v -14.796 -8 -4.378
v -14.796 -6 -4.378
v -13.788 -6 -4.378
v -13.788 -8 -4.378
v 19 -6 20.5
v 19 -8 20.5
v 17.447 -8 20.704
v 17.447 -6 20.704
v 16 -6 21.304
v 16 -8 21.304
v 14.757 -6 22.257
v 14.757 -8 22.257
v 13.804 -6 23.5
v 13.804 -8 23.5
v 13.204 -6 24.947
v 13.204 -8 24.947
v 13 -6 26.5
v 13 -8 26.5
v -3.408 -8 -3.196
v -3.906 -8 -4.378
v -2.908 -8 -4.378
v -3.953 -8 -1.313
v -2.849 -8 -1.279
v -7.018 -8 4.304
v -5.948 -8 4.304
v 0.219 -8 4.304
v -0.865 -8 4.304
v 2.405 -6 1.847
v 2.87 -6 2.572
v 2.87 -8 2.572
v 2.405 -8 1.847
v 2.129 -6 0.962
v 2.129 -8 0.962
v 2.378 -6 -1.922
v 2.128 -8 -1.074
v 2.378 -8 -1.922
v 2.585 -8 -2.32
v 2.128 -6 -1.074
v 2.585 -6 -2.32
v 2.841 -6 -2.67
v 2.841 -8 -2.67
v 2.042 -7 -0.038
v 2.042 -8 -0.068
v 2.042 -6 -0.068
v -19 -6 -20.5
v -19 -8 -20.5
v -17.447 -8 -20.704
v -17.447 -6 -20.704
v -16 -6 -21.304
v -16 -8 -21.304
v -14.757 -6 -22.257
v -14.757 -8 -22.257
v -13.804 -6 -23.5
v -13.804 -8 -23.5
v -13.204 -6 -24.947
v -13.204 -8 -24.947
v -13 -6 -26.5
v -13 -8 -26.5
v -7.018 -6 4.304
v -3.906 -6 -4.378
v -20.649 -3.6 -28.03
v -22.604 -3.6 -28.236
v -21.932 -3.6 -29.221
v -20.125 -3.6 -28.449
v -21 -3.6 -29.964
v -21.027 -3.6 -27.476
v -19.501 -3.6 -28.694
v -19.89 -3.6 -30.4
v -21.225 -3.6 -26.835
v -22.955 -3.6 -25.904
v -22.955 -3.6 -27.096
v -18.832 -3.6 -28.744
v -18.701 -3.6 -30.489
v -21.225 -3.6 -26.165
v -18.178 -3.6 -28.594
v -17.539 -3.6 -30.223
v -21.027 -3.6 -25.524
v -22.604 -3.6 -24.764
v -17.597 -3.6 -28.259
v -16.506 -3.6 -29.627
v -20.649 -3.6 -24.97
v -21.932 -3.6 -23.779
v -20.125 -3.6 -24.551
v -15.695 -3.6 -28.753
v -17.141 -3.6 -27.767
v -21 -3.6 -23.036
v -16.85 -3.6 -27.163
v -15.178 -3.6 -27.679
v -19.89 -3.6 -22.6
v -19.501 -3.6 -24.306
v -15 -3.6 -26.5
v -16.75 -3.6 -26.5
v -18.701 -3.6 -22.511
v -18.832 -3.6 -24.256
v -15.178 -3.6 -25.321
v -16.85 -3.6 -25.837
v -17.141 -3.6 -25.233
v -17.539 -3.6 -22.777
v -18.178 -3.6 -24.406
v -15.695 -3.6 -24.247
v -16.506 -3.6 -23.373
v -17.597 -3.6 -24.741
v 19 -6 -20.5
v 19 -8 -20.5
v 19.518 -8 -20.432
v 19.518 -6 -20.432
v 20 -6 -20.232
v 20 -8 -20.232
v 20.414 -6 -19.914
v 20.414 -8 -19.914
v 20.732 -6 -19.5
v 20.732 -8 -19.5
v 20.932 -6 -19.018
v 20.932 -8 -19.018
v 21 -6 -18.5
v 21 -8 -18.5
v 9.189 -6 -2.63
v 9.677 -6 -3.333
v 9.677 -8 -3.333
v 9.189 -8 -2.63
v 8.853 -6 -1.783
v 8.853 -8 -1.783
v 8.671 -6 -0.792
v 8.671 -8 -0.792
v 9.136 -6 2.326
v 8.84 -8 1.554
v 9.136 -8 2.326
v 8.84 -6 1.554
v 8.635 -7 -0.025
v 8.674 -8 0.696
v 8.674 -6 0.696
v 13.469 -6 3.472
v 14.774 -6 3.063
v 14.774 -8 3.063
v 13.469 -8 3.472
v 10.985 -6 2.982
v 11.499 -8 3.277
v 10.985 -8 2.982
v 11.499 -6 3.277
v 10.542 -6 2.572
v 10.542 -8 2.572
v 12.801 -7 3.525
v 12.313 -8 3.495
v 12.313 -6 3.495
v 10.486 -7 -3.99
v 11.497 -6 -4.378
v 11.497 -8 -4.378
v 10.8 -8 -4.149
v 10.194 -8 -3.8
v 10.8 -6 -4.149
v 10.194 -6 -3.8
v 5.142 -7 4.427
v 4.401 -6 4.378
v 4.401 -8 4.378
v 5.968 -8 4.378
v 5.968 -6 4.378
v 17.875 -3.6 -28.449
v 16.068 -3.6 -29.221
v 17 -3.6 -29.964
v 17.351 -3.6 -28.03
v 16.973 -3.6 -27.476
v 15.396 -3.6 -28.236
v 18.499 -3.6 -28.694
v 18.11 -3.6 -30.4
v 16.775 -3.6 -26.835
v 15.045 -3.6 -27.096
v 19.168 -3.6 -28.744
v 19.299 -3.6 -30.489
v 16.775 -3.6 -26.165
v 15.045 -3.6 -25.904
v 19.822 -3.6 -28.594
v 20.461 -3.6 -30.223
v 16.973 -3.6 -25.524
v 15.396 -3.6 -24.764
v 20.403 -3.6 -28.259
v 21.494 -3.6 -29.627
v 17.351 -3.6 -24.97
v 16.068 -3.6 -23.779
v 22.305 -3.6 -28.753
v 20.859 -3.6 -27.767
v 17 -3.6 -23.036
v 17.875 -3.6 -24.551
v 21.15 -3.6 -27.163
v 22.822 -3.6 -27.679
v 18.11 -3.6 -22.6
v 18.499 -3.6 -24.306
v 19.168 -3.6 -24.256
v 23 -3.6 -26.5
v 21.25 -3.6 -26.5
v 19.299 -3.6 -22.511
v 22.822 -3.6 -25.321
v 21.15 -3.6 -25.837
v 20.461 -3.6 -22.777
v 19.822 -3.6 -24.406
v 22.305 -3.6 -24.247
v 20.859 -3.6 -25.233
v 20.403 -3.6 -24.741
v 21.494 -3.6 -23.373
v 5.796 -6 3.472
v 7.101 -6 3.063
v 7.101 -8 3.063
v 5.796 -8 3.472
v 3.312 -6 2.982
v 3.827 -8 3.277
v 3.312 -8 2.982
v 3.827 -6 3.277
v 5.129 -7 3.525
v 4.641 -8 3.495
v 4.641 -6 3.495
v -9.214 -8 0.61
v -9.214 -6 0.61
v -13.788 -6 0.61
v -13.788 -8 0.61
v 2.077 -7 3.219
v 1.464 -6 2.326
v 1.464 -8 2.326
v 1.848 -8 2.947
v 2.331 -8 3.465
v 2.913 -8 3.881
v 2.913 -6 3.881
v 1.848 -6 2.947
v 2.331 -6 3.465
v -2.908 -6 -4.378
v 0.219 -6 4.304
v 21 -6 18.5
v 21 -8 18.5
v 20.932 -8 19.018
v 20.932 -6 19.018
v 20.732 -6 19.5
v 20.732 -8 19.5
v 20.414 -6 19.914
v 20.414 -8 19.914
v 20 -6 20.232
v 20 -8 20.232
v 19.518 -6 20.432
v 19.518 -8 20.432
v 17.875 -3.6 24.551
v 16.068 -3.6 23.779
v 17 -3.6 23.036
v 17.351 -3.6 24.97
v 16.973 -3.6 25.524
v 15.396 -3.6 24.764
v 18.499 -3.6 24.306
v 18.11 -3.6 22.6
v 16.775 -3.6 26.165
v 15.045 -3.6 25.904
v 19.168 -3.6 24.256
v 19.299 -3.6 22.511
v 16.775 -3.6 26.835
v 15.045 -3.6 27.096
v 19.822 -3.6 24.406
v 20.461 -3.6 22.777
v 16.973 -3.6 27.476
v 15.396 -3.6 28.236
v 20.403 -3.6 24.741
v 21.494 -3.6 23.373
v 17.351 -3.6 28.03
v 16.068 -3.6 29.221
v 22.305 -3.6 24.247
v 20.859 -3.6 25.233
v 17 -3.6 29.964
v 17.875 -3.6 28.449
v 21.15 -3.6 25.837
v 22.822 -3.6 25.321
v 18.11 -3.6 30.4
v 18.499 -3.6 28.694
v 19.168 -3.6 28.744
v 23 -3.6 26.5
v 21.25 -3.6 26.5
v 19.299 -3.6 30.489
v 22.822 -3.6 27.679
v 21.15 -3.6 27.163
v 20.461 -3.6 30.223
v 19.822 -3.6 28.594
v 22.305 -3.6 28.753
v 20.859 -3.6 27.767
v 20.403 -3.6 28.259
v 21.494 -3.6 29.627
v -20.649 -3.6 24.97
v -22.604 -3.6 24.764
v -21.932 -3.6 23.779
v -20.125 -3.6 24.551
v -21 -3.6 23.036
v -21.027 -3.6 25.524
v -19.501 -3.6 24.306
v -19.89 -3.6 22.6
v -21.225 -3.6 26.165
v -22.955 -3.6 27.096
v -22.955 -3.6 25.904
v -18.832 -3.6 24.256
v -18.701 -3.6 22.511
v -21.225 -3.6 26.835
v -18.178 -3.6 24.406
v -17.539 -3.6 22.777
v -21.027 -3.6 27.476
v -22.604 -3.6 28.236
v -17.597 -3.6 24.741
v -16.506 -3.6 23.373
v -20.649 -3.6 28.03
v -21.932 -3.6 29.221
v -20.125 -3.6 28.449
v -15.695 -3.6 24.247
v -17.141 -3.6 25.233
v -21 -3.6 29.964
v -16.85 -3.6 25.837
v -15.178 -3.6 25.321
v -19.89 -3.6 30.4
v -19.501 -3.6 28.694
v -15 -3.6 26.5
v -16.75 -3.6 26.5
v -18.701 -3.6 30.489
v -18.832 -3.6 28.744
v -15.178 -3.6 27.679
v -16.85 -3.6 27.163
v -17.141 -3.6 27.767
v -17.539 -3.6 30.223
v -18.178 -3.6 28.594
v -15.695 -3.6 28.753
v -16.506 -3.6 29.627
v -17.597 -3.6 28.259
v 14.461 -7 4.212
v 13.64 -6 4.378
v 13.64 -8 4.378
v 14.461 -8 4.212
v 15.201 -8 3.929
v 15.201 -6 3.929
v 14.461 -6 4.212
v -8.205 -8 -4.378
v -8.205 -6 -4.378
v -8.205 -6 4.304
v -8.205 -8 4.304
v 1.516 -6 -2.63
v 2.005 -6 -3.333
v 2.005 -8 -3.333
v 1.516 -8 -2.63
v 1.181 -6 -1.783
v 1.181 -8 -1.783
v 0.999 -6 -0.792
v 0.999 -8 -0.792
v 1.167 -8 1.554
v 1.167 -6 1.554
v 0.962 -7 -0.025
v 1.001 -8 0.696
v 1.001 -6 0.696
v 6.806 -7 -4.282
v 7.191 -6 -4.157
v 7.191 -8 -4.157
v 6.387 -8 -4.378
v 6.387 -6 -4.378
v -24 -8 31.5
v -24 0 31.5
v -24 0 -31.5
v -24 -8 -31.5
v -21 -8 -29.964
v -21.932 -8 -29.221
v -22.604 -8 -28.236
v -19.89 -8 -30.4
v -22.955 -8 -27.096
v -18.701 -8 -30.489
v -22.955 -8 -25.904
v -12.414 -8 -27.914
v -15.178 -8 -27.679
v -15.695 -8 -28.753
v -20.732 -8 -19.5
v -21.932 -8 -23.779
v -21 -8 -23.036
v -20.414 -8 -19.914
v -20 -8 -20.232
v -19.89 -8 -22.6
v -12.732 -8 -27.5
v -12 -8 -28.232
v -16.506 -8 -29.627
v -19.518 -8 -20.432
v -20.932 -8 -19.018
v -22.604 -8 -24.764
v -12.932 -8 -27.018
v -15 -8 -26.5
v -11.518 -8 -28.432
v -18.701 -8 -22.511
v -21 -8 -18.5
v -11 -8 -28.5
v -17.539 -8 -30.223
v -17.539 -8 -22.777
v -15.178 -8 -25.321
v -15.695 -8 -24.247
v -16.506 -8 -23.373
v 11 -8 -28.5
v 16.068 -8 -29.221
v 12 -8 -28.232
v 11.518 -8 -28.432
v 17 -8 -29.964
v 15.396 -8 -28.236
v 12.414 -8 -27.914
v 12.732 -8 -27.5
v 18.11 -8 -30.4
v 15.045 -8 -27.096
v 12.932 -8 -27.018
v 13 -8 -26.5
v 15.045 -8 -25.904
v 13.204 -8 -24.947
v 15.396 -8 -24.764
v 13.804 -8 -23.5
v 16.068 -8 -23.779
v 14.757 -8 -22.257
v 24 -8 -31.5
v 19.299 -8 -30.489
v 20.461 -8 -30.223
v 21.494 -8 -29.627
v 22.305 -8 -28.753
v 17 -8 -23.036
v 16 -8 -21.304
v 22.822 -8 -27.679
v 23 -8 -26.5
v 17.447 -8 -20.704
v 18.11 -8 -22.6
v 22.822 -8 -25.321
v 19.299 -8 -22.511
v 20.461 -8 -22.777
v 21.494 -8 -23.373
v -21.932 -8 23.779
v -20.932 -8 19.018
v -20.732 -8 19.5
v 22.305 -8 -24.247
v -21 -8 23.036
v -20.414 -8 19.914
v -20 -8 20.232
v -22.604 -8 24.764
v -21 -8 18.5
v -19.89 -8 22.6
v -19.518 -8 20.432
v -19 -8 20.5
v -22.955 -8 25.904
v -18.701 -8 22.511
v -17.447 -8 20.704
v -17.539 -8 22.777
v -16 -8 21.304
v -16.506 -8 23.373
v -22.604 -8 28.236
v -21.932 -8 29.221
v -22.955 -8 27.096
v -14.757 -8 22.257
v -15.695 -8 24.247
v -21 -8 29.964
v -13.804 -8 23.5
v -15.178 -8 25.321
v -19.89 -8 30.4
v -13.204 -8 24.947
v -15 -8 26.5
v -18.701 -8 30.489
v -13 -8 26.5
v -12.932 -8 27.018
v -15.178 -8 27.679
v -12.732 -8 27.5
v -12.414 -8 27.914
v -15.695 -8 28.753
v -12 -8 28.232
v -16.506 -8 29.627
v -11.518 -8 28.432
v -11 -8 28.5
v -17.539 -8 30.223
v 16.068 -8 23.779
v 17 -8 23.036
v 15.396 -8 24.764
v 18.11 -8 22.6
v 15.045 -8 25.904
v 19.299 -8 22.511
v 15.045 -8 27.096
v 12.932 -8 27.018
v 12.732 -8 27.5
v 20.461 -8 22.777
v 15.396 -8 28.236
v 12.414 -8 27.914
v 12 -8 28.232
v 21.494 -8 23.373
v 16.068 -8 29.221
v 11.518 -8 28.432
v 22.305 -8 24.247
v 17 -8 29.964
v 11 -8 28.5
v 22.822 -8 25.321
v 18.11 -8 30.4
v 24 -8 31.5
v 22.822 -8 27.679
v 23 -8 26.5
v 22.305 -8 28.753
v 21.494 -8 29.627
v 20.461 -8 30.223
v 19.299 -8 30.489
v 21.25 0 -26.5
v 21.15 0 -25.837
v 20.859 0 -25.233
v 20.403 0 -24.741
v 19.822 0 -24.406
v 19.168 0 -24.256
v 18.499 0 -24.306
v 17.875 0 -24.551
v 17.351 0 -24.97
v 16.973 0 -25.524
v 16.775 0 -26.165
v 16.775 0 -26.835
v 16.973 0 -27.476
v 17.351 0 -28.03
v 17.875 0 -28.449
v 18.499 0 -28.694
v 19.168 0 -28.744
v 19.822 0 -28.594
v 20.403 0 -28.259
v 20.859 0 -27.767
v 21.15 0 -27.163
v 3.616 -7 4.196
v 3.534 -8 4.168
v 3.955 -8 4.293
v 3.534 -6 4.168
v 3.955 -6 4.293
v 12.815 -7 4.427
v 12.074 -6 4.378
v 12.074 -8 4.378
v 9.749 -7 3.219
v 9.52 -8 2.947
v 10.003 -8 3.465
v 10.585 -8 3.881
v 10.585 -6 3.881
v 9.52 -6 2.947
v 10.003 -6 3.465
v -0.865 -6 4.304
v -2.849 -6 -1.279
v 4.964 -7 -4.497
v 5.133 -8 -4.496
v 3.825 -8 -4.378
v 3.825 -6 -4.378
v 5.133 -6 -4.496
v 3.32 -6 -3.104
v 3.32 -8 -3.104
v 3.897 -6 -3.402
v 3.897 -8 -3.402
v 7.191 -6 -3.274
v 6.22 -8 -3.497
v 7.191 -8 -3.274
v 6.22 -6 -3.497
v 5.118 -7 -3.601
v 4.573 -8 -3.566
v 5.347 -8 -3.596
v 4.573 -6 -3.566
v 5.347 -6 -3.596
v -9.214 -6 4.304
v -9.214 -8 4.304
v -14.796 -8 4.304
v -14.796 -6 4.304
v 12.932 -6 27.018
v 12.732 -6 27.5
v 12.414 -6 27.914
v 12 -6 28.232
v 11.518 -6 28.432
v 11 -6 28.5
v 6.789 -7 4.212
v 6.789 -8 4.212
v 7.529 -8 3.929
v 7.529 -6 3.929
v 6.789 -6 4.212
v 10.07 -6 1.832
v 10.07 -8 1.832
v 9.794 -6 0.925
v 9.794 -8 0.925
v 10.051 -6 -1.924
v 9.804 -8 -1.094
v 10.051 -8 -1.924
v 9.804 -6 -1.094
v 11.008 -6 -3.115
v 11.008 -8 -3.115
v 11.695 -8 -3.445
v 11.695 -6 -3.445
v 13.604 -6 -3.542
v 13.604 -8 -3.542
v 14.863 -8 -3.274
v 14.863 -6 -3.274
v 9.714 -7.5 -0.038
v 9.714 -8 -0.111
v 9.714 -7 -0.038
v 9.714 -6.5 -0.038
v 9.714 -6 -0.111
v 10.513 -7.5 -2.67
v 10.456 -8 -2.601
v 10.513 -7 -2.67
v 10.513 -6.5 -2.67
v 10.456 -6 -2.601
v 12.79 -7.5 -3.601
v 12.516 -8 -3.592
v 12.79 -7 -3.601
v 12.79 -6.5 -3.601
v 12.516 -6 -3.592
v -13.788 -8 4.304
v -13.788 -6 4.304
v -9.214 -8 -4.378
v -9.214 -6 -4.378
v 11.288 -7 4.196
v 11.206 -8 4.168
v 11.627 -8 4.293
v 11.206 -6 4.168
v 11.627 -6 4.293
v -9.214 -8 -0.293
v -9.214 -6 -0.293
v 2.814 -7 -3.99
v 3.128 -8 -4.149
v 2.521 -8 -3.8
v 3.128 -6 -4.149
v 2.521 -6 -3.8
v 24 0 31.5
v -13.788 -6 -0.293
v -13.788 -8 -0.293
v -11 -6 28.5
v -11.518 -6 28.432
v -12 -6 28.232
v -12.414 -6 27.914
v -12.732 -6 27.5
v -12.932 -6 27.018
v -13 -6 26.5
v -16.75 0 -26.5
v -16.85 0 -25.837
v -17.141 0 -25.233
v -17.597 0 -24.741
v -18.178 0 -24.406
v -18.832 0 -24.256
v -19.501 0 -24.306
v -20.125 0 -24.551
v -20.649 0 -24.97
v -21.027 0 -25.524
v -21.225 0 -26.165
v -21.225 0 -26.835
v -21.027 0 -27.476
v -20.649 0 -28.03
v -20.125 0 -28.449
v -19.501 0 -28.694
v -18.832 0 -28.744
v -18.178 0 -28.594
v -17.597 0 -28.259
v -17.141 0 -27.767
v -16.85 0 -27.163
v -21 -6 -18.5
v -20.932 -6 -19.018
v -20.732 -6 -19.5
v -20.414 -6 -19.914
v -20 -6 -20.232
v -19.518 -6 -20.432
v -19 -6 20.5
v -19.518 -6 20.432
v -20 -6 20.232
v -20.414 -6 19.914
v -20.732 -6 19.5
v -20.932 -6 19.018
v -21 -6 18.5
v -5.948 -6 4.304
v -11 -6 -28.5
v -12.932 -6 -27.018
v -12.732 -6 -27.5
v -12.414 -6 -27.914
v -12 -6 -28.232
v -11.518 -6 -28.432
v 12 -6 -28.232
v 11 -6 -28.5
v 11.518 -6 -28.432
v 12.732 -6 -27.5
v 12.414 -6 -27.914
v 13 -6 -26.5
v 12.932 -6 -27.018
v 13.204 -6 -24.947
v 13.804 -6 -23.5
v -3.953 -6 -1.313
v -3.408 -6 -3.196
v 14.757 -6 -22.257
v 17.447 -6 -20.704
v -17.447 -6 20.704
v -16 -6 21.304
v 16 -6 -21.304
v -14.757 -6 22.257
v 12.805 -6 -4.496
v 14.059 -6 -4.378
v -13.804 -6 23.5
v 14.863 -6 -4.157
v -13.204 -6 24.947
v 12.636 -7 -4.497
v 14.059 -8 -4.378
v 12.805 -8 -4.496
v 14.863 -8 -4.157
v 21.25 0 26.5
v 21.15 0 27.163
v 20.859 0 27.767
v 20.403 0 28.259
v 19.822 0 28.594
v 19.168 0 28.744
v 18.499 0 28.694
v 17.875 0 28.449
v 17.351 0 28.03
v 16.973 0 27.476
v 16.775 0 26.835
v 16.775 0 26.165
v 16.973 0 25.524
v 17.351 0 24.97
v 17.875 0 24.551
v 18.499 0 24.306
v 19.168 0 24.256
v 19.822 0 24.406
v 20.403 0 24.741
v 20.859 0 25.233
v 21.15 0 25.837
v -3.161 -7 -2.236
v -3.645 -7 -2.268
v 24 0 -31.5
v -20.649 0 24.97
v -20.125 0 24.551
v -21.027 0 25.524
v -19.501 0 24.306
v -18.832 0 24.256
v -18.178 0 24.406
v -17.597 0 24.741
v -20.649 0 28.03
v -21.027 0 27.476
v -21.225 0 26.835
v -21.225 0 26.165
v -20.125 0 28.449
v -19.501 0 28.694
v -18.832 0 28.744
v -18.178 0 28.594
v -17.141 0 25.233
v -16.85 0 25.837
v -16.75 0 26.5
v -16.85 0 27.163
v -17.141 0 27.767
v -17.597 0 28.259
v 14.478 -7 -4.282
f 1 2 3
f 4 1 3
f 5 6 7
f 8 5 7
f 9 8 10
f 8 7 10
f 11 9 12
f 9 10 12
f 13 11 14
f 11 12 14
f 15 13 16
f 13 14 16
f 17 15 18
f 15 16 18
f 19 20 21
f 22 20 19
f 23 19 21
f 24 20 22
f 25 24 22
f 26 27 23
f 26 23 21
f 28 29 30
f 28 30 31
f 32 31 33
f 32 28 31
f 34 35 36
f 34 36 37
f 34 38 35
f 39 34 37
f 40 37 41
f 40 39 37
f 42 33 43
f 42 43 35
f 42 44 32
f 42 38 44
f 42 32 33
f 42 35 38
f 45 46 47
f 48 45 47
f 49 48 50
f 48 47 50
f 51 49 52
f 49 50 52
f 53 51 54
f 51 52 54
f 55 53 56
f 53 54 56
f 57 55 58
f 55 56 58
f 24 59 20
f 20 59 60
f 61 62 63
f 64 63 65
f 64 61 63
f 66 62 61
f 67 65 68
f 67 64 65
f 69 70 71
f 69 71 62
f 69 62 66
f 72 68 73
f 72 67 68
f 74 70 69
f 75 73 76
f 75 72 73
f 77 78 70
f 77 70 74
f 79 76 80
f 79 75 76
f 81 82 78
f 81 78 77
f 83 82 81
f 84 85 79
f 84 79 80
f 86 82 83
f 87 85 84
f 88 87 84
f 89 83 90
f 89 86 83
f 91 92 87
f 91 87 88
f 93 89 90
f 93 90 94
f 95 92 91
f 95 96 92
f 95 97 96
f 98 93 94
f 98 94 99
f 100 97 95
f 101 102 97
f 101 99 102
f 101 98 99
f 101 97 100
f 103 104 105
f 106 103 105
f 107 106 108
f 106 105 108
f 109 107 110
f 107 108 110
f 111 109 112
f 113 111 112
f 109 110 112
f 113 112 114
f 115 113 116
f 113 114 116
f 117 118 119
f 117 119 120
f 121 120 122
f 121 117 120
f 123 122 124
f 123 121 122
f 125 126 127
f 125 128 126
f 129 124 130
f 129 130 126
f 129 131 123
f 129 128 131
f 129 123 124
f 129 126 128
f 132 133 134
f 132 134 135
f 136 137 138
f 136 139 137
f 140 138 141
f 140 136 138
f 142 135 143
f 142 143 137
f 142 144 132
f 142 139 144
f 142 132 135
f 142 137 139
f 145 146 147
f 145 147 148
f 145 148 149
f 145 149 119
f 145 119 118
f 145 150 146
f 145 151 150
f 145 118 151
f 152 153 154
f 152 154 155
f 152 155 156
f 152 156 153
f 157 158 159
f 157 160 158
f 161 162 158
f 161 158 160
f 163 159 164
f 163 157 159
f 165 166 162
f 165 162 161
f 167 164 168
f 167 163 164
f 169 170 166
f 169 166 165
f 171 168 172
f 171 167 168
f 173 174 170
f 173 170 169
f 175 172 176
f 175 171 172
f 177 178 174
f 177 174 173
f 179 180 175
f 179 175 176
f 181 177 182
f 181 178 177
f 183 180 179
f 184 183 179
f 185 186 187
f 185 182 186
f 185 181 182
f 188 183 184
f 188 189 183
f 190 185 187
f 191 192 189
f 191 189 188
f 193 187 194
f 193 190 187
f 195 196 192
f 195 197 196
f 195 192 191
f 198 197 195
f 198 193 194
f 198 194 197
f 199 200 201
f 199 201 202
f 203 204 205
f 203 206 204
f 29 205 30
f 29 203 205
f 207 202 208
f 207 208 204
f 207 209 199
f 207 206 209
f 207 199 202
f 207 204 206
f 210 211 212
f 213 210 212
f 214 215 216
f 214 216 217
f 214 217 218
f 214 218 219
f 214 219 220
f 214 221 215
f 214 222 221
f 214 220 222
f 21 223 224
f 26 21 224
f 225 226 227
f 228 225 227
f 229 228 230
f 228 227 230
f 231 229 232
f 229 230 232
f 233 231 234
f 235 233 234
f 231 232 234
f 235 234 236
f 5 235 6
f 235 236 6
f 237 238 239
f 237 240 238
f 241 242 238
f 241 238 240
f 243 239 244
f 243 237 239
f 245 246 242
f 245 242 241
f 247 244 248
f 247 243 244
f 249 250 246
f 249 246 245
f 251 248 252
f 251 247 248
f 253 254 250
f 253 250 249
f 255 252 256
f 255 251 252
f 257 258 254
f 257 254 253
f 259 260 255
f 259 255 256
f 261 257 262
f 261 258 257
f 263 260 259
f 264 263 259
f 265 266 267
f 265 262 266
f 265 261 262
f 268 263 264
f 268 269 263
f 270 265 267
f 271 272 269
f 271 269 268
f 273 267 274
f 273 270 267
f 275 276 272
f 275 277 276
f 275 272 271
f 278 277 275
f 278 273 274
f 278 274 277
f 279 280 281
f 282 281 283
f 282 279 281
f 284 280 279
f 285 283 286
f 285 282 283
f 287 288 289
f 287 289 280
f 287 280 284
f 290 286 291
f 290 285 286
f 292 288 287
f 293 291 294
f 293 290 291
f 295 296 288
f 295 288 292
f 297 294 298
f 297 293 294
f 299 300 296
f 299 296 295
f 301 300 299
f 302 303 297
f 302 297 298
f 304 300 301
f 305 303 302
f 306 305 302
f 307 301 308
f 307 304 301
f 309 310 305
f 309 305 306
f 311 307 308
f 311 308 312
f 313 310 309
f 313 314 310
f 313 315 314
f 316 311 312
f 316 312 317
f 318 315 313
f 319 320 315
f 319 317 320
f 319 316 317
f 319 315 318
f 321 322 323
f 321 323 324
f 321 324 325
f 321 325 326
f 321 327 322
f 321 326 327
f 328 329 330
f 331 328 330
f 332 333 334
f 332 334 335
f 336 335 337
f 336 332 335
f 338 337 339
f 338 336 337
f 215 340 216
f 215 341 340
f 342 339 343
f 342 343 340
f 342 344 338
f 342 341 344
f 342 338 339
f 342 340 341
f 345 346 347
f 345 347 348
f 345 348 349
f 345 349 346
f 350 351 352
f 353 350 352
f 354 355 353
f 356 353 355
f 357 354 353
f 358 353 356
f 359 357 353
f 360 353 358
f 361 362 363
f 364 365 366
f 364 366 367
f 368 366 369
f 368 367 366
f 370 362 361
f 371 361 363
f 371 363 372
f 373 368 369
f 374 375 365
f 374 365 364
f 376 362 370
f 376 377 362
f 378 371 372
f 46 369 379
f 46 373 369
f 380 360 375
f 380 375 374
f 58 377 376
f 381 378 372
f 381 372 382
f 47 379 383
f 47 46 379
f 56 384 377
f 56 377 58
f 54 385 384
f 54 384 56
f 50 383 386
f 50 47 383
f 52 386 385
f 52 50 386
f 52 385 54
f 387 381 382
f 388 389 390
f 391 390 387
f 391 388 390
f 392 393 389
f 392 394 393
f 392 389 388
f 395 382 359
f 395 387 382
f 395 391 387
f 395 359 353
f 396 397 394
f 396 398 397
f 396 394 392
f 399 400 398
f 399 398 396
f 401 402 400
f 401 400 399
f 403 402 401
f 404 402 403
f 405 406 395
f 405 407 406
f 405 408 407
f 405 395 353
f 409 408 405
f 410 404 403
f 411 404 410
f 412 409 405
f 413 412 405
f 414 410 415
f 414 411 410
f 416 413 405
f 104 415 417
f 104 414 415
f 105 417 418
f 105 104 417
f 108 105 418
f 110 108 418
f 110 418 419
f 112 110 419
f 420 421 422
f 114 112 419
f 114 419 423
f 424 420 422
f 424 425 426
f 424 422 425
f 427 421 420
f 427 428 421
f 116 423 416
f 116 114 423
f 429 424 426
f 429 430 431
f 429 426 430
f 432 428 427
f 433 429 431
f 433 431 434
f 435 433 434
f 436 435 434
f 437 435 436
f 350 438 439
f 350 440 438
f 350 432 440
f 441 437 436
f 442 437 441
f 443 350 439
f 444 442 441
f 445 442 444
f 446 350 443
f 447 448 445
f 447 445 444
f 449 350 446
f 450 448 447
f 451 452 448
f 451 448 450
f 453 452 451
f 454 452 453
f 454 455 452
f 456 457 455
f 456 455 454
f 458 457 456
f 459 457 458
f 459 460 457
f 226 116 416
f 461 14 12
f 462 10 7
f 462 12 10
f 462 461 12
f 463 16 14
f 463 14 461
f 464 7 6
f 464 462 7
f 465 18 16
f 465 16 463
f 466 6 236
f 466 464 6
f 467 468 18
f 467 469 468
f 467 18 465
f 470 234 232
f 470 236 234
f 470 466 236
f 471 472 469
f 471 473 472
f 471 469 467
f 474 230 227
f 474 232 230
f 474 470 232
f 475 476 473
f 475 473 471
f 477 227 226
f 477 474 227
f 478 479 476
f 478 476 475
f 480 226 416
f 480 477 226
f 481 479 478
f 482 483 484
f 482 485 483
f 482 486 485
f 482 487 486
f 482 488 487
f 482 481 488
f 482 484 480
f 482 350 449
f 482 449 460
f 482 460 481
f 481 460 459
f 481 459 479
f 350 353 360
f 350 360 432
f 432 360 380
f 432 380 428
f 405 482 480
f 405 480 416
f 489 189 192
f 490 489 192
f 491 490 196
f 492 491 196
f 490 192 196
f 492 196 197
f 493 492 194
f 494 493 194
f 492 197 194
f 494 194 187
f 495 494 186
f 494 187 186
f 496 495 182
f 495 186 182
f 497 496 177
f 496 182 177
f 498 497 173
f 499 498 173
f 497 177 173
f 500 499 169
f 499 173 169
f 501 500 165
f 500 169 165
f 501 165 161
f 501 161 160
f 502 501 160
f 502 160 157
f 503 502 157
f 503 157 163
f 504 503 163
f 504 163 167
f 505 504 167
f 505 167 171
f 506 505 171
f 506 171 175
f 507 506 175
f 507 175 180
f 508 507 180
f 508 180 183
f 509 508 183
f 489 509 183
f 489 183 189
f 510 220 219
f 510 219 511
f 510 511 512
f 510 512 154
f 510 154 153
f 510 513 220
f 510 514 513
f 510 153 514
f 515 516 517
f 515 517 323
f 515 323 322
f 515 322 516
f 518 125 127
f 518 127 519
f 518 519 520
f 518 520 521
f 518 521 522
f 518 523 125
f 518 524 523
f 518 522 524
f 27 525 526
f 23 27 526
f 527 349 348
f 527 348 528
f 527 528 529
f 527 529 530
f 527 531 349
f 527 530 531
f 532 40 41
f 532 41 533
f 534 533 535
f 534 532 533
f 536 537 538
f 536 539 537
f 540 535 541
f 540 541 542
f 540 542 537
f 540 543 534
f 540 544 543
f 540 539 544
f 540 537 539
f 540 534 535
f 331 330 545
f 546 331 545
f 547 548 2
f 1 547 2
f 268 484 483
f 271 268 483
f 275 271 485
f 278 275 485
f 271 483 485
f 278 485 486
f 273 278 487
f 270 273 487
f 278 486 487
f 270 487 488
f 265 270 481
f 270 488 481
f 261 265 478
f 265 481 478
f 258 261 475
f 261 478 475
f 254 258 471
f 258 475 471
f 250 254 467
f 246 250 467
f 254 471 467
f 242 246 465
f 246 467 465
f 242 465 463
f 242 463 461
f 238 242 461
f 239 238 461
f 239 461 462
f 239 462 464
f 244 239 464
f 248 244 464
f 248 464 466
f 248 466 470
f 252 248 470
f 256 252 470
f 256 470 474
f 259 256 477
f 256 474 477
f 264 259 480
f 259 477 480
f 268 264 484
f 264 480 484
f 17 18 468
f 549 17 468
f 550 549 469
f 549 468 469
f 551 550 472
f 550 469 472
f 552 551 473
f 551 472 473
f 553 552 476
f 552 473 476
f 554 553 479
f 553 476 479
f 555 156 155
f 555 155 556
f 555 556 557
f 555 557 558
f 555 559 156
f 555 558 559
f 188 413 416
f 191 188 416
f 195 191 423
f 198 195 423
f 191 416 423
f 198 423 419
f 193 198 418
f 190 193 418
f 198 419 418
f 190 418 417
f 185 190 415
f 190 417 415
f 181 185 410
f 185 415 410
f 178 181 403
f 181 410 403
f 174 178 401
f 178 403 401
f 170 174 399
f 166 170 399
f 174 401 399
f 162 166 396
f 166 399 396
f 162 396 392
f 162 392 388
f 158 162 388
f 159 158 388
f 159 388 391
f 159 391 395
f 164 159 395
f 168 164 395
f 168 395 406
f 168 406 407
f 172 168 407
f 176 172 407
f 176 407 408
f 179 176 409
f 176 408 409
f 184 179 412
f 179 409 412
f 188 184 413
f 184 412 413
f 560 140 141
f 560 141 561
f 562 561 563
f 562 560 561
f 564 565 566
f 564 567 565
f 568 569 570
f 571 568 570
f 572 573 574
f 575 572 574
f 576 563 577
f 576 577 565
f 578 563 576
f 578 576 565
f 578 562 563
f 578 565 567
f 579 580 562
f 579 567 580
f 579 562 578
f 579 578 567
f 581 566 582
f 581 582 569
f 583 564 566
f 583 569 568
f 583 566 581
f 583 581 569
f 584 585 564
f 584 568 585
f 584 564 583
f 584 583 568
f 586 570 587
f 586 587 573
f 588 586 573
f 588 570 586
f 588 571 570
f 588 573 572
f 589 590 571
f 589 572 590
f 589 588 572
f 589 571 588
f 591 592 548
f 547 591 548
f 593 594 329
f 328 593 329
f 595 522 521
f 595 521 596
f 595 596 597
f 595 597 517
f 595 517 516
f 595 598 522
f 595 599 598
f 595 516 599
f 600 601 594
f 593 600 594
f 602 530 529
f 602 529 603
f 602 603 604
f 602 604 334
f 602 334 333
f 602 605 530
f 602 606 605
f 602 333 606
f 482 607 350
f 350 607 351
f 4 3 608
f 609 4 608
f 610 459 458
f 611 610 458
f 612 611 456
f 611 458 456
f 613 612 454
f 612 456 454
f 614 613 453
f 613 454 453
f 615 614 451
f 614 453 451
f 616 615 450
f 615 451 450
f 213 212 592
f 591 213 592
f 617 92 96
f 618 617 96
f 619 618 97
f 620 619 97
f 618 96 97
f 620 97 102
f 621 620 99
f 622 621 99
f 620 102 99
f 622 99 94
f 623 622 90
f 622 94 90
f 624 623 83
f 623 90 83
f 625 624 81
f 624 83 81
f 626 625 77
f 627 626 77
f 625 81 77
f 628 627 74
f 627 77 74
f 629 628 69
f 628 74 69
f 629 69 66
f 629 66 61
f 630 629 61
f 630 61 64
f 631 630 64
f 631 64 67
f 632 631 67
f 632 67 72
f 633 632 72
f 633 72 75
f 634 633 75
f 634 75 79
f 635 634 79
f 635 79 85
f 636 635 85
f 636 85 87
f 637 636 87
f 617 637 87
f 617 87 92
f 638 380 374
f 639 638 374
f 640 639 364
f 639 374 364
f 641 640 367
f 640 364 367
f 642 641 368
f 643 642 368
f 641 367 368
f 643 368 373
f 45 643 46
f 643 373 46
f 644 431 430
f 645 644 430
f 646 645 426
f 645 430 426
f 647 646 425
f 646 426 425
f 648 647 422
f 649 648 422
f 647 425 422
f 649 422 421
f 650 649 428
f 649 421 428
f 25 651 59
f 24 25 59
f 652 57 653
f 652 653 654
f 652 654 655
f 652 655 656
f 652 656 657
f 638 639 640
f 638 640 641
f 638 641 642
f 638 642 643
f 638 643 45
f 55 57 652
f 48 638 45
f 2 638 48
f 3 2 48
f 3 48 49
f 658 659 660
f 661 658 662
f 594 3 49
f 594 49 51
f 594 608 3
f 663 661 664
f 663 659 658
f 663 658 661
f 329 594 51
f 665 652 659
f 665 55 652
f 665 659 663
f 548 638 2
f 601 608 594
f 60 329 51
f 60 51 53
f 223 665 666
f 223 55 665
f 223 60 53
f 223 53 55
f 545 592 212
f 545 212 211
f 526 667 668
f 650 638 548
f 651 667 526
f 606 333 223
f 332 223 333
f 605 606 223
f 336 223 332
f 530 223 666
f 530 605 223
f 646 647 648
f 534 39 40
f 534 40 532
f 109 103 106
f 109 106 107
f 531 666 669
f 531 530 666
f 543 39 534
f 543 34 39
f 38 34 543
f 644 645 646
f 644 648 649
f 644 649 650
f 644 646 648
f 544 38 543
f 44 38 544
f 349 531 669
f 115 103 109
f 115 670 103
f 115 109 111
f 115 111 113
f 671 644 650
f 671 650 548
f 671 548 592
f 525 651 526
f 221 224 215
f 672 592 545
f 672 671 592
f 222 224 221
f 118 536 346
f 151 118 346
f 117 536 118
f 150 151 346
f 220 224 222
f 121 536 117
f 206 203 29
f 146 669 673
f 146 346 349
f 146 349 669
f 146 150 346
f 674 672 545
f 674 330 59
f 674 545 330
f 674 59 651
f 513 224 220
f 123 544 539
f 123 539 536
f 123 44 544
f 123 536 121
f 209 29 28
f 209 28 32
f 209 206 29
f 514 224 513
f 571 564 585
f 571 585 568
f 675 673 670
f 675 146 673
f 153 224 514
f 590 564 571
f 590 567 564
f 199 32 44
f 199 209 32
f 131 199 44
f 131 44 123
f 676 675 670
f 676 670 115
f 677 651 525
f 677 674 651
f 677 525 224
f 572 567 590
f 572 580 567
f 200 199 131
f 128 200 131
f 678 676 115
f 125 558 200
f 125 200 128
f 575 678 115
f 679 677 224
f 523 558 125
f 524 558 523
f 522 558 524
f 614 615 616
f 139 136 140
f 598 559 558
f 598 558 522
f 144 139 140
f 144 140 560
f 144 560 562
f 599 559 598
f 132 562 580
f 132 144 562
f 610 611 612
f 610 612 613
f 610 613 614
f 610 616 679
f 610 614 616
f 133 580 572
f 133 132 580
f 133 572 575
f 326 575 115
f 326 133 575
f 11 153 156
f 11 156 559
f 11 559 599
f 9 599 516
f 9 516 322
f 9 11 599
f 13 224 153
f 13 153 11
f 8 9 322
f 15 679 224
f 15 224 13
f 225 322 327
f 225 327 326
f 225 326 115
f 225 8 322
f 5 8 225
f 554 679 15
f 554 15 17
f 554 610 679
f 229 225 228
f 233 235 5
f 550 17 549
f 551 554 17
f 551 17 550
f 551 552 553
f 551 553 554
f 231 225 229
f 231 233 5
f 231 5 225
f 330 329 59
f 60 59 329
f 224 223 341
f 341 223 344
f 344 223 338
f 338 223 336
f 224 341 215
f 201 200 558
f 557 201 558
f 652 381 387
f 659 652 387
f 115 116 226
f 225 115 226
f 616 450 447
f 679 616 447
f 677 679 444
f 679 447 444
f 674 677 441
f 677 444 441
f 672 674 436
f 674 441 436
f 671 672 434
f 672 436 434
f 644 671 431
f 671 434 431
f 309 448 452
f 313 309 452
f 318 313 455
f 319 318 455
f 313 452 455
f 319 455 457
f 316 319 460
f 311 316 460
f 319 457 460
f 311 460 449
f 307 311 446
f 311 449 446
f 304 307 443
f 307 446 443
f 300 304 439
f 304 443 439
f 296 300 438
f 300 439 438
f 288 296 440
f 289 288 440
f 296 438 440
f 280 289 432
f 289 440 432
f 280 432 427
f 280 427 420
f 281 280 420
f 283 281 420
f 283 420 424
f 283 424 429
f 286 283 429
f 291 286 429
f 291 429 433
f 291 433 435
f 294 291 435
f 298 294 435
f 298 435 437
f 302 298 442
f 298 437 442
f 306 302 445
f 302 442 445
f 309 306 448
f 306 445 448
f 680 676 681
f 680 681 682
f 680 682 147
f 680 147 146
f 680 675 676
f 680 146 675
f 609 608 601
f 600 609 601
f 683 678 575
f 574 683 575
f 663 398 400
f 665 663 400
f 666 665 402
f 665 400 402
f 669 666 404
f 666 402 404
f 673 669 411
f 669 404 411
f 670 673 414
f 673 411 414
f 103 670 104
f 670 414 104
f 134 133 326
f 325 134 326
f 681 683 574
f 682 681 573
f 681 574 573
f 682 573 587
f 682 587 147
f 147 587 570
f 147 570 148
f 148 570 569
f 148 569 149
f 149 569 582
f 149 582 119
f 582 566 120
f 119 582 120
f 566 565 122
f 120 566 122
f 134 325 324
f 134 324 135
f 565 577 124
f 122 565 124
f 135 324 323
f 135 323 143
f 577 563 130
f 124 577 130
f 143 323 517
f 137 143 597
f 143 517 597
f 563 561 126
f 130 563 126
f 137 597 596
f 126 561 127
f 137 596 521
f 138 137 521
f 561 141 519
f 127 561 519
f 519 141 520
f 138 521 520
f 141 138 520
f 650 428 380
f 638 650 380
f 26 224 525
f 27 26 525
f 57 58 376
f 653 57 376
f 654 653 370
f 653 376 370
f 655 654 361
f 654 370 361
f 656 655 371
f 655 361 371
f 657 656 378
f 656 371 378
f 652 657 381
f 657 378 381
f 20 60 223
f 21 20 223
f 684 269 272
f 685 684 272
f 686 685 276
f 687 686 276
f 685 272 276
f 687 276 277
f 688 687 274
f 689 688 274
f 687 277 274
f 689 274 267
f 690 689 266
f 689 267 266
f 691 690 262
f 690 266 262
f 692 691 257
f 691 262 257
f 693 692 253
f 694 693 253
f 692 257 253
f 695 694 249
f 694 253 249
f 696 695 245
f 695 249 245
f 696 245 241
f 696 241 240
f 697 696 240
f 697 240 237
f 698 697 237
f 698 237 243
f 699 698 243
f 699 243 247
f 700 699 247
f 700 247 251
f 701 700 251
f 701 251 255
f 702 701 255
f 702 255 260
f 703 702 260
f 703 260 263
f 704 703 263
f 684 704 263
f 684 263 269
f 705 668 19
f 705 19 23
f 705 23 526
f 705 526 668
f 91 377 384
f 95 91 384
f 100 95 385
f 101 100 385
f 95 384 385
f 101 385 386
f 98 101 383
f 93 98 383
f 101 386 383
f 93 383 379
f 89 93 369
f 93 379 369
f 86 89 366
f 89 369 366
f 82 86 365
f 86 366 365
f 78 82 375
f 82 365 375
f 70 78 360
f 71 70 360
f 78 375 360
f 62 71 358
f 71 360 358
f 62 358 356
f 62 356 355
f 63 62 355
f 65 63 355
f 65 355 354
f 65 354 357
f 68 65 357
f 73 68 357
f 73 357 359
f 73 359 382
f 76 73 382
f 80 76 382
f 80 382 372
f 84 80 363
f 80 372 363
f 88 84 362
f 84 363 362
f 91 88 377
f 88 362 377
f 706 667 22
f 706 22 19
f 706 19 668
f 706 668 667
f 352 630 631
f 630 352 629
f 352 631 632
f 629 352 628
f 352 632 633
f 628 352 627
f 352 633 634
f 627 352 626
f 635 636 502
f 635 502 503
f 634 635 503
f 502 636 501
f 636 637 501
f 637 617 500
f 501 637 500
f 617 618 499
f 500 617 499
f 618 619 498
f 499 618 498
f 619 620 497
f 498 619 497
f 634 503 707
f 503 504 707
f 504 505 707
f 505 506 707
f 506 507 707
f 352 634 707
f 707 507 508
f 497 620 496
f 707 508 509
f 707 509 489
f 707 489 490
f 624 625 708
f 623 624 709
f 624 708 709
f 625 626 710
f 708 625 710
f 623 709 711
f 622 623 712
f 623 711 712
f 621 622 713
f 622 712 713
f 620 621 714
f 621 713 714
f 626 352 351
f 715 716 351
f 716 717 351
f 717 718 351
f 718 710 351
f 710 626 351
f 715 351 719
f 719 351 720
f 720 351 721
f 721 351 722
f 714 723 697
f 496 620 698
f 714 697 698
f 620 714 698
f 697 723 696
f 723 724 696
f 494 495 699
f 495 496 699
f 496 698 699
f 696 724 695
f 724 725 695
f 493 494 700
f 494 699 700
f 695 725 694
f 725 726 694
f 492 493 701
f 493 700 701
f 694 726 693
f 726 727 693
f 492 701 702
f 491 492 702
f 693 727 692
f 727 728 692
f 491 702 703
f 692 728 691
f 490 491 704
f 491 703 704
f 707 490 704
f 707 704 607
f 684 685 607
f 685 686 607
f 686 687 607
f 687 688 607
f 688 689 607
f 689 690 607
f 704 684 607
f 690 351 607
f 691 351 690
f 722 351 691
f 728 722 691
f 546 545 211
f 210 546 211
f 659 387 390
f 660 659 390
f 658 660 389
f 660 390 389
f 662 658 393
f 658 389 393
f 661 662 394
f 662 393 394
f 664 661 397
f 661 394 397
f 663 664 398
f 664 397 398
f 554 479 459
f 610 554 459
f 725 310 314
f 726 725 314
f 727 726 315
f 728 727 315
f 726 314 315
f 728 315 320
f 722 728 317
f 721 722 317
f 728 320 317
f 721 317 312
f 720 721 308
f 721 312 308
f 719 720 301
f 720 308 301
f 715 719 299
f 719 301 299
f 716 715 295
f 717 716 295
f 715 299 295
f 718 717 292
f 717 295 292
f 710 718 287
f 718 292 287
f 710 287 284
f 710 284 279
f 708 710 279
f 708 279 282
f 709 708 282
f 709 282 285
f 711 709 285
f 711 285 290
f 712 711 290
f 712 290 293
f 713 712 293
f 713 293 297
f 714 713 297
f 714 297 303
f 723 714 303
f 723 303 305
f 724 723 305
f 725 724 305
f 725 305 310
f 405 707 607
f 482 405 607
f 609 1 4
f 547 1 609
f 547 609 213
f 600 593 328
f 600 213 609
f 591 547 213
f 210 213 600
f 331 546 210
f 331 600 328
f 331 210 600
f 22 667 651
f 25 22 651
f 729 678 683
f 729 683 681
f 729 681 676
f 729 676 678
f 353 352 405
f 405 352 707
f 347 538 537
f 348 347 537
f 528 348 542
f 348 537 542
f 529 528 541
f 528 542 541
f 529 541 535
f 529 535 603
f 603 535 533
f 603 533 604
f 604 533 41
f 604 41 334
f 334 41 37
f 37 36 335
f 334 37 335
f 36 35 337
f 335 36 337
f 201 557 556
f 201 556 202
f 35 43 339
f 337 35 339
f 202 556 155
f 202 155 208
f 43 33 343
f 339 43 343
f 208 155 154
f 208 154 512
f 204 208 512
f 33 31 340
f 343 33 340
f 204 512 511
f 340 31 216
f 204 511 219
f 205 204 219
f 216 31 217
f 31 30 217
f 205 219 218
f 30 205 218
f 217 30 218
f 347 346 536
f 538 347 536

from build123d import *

# Parameters (mm, degrees)
F1_DEPTH  = 8
F2_R      = 2.25
F3_DEPTH  = 2
F5_DEPTH  = 2
F7_DEPTH  = 2
F2_R_2    = 4
F8_DEPTH  = 4.4
F9_DEPTH  = 8.001
F10_DEPTH = 8.001
F11_DEPTH = 4.4


# Not quite as in the source:
# - a feature names something its author has since deleted; it is built from what else it names


with BuildPart() as f1:
    # F0 (on Front) → F1 (new body)
    with BuildSketch(Plane.XZ):
        Polygon((24, 31.5), (0, 31.5), (-24, 31.5), (-24, -31.5), (0, -31.5), (24, -31.5), align=None)
    extrude(amount=F1_DEPTH)

    # F2 (on face) → F3 (cut)
    with BuildSketch(Plane.XZ.offset(8)):
        with Locations((-19, 26.5)):
            Circle(F2_R)
        with Locations((19, 26.5)):
            Circle(F2_R)
    extrude(amount=-F3_DEPTH, mode=Mode.SUBTRACT)

    # F4 (on face) → F5 (cut)
    with BuildSketch(Plane.XZ.offset(8)):
        with BuildLine():
            Line((-11, -28.5), (0, -28.5))
            Line((0, -28.5), (11, -28.5))
            ThreePointArc((11, -28.5), (12.4142135624, -27.9142135624), (13, -26.5))
            ThreePointArc((13, -26.5), (14.7573593129, -22.2573593129), (19, -20.5))
            ThreePointArc((19, -20.5), (20.4142135624, -19.9142135624), (21, -18.5))
            Line((21, -18.5), (21, 0))
            Line((21, 0), (21, 18.5))
            ThreePointArc((21, 18.5), (20.4142135624, 19.9142135624), (19, 20.5))
            ThreePointArc((19, 20.5), (14.7573593129, 22.2573593129), (13, 26.5))
            ThreePointArc((13, 26.5), (12.4142135624, 27.9142135624), (11, 28.5))
            Line((11, 28.5), (0, 28.5))
            Line((0, 28.5), (-11, 28.5))
            ThreePointArc((-11, 28.5), (-12.4142135624, 27.9142135624), (-13, 26.5))
            ThreePointArc((-13, 26.5), (-14.7573593129, 22.2573593129), (-19, 20.5))
            ThreePointArc((-19, 20.5), (-20.4142135624, 19.9142135624), (-21, 18.5))
            Line((-21, 18.5), (-21, 0))
            Line((-21, 0), (-21, -18.5))
            ThreePointArc((-21, -18.5), (-20.4142135624, -19.9142135624), (-19, -20.5))
            ThreePointArc((-19, -20.5), (-14.7573593129, -22.2573593129), (-13, -26.5))
            ThreePointArc((-13, -26.5), (-12.4142135624, -27.9142135624), (-11, -28.5))
        make_face()
    extrude(amount=-F5_DEPTH, mode=Mode.SUBTRACT)

    # F6 (on face) → F7 (join)
    with BuildSketch(Plane.XZ.offset(6)):
        Polygon((-9.214199551, -4.3776710518), (-8.2052831758, -4.3776710518), (-8.2052831758, 4.3035698491), (-9.214199551, 4.3035698491), (-9.214199551, 0.6099098991), (-13.7875737792, 0.6099098991), (-13.7875737792, 4.3035698491), (-14.7964901544, 4.3035698491), (-14.7964901544, -4.3776710518), (-13.7875737792, -4.3776710518), (-13.7875737792, -0.2926047491), (-9.214199551, -0.2926047491), align=None)
        with BuildLine():
            Line((-3.9055133884, -4.3776710518), (-2.9079971982, -4.3776710518))
            Line((-2.9079971982, -4.3776710518), (0.2194535618, 4.3035698491))
            Line((0.2194535618, 4.3035698491), (-0.8654640469, 4.3035698491))
            Line((-0.8654640469, 4.3035698491), (-2.8490962422, -1.2787207543))
            add(Edge.make_bspline(
                [(-3.4077053087, -3.1958518703), (-3.193001824, -2.234436266), (-2.8490962422, -1.2787207543)],
                knots=[0, 0, 0, 1, 1, 1], degree=2))
            add(Edge.make_bspline(
                [(-3.9530141594, -1.3129213094), (-3.6091085776, -2.281937037), (-3.4077053087, -3.1958518703)],
                knots=[0, 0, 0, 1, 1, 1], degree=2))
            Line((-3.9530141594, -1.3129213094), (-5.9480465397, 4.3035698491))
            Line((-5.9480465397, 4.3035698491), (-7.0177639018, 4.3035698491))
            Line((-7.0177639018, 4.3035698491), (-3.9055133884, -4.3776710518))
        make_face()
        with BuildLine():
            add(Edge.make_bspline(
                [(3.8245554648, -4.3776710518), (2.7125988005, -4.1239843021), (2.0045325346, -3.3326540906)],
                knots=[0.3205826669, 0.3205826669, 0.3205826669, 1, 1, 1], degree=2))
            Line((3.8245554648, -4.3776710518), (6.3867026136, -4.3776710518))
            add(Edge.make_bspline(
                [(7.1906667081, -4.1572674745), (6.8235762872, -4.2956026015), (6.3867026136, -4.3776710518)],
                knots=[0, 0, 0, 0.406741787, 0.406741787, 0.406741787], degree=2))
            Line((7.1906667081, -4.1572674745), (7.1906667081, -3.2737531346))
            add(Edge.make_bspline(
                [(5.1177330633, -3.6005584388), (6.0259478041, -3.6005584388), (7.1906667081, -3.2737531346)],
                knots=[0, 0, 0, 1, 1, 1], degree=2))
            add(Edge.make_bspline(
                [(2.8405461035, -2.6704933434), (3.639509071, -3.6005584388), (5.1177330633, -3.6005584388)],
                knots=[0, 0, 0, 1, 1, 1], degree=2))
            add(Edge.make_bspline(
                [(2.0415831359, -0.0380006168), (2.0415831359, -1.740428248), (2.8405461035, -2.6704933434)],
                knots=[0, 0, 0, 1, 1, 1], degree=2))
            add(Edge.make_bspline(
                [(2.8699965815, 2.5716917398), (2.0415831359, 1.6188262744), (2.0415831359, -0.0380006168)],
                knots=[0, 0, 0, 1, 1, 1], degree=2))
            add(Edge.make_bspline(
                [(5.1291332484, 3.5245572053), (3.698410027, 3.5245572053), (2.8699965815, 2.5716917398)],
                knots=[0, 0, 0, 1, 1, 1], degree=2))
            add(Edge.make_bspline(
                [(7.1013652587, 3.0628497116), (6.1152492535, 3.5245572053), (5.1291332484, 3.5245572053)],
                knots=[0, 0, 0, 1, 1, 1], degree=2))
            Line((7.1013652587, 3.0628497116), (7.5288721973, 3.9292637739))
            add(Edge.make_bspline(
                [(5.9680043466, 4.3776710518), (6.8286727205, 4.2702531102), (7.5288721973, 3.9292637739)],
                knots=[0.3150184776, 0.3150184776, 0.3150184776, 1, 1, 1], degree=2))
            Line((5.9680043466, 4.3776710518), (4.4013922849, 4.3776710518))
            add(Edge.make_bspline(
                [(2.9127472753, 3.8808129875), (3.5750775116, 4.2627988309), (4.4013922849, 4.3776710518)],
                knots=[0, 0, 0, 0.6992762354, 0.6992762354, 0.6992762354], degree=2))
            add(Edge.make_bspline(
                [(1.463973761, 2.3256377463), (1.9655819024, 3.3345541215), (2.9127472753, 3.8808129875)],
                knots=[0, 0, 0, 1, 1, 1], degree=2))
            add(Edge.make_bspline(
                [(0.9623656197, -0.0247004009), (0.9623656197, 1.316721371), (1.463973761, 2.3256377463)],
                knots=[0, 0, 0, 1, 1, 1], degree=2))
            add(Edge.make_bspline(
                [(2.0045325346, -3.3326540906), (0.9623656197, -2.1679351867), (0.9623656197, -0.0247004009)],
                knots=[0, 0, 0, 1, 1, 1], degree=2))
        make_face()
        with BuildLine():
            add(Edge.make_bspline(
                [(11.4968799904, -4.3776710518), (10.3849233261, -4.1239843021), (9.6768570602, -3.3326540906)],
                knots=[0.3205826669, 0.3205826669, 0.3205826669, 1, 1, 1], degree=2))
            Line((11.4968799904, -4.3776710518), (14.0590271393, -4.3776710518))
            add(Edge.make_bspline(
                [(14.8629912337, -4.1572674745), (14.4959008129, -4.2956026015), (14.0590271393, -4.3776710518)],
                knots=[0, 0, 0, 0.406741787, 0.406741787, 0.406741787], degree=2))
            Line((14.8629912337, -4.1572674745), (14.8629912337, -3.2737531346))
            add(Edge.make_bspline(
                [(12.790057589, -3.6005584388), (13.6982723297, -3.6005584388), (14.8629912337, -3.2737531346)],
                knots=[0, 0, 0, 1, 1, 1], degree=2))
            add(Edge.make_bspline(
                [(10.5128706291, -2.6704933434), (11.3118335967, -3.6005584388), (12.790057589, -3.6005584388)],
                knots=[0, 0, 0, 1, 1, 1], degree=2))
            add(Edge.make_bspline(
                [(9.7139076615, -0.0380006168), (9.7139076615, -1.740428248), (10.5128706291, -2.6704933434)],
                knots=[0, 0, 0, 1, 1, 1], degree=2))
            add(Edge.make_bspline(
                [(10.5423211071, 2.5716917398), (9.7139076615, 1.6188262744), (9.7139076615, -0.0380006168)],
                knots=[0, 0, 0, 1, 1, 1], degree=2))
            add(Edge.make_bspline(
                [(12.801457774, 3.5245572053), (11.3707345527, 3.5245572053), (10.5423211071, 2.5716917398)],
                knots=[0, 0, 0, 1, 1, 1], degree=2))
            add(Edge.make_bspline(
                [(14.7736897843, 3.0628497116), (13.7875737792, 3.5245572053), (12.801457774, 3.5245572053)],
                knots=[0, 0, 0, 1, 1, 1], degree=2))
            Line((14.7736897843, 3.0628497116), (15.201196723, 3.9292637739))
            add(Edge.make_bspline(
                [(13.6403288722, 4.3776710518), (14.5009972462, 4.2702531102), (15.201196723, 3.9292637739)],
                knots=[0.3150184776, 0.3150184776, 0.3150184776, 1, 1, 1], degree=2))
            Line((13.6403288722, 4.3776710518), (12.0737168105, 4.3776710518))
            add(Edge.make_bspline(
                [(10.585071801, 3.8808129875), (11.2474020372, 4.2627988309), (12.0737168105, 4.3776710518)],
                knots=[0, 0, 0, 0.6992762354, 0.6992762354, 0.6992762354], degree=2))
            add(Edge.make_bspline(
                [(9.1362982866, 2.3256377463), (9.637906428, 3.3345541215), (10.585071801, 3.8808129875)],
                knots=[0, 0, 0, 1, 1, 1], degree=2))
            add(Edge.make_bspline(
                [(8.6346901453, -0.0247004009), (8.6346901453, 1.316721371), (9.1362982866, 2.3256377463)],
                knots=[0, 0, 0, 1, 1, 1], degree=2))
            add(Edge.make_bspline(
                [(9.6768570602, -3.3326540906), (8.6346901453, -2.1679351867), (8.6346901453, -0.0247004009)],
                knots=[0, 0, 0, 1, 1, 1], degree=2))
        make_face()
        with BuildLine():
            Line((6.3867026136, -4.3776710518), (3.8245554648, -4.3776710518))
            add(Edge.make_bspline(
                [(4.9638305654, -4.4973729946), (4.3492315594, -4.4973729946), (3.8245554648, -4.3776710518)],
                knots=[0, 0, 0, 0.3205826669, 0.3205826669, 0.3205826669], degree=2))
            add(Edge.make_bspline(
                [(6.3867026136, -4.3776710518), (5.7494951686, -4.4973729946), (4.9638305654, -4.4973729946)],
                knots=[0.406741787, 0.406741787, 0.406741787, 1, 1, 1], degree=2))
        make_face()
        with BuildLine():
            Line((14.0590271393, -4.3776710518), (11.4968799904, -4.3776710518))
            add(Edge.make_bspline(
                [(12.6361550911, -4.4973729946), (12.0215560851, -4.4973729946), (11.4968799904, -4.3776710518)],
                knots=[0, 0, 0, 0.3205826669, 0.3205826669, 0.3205826669], degree=2))
            add(Edge.make_bspline(
                [(14.0590271393, -4.3776710518), (13.4218196942, -4.4973729946), (12.6361550911, -4.4973729946)],
                knots=[0.406741787, 0.406741787, 0.406741787, 1, 1, 1], degree=2))
        make_face()
        with BuildLine():
            add(Edge.make_bspline(
                [(4.4013922849, 4.3776710518), (4.7567489763, 4.4270718536), (5.1424334642, 4.4270718536)],
                knots=[0.6992762354, 0.6992762354, 0.6992762354, 1, 1, 1], degree=2))
            Line((4.4013922849, 4.3776710518), (5.9680043466, 4.3776710518))
            add(Edge.make_bspline(
                [(5.1424334642, 4.4270718536), (5.5721886465, 4.4270718536), (5.9680043466, 4.3776710518)],
                knots=[0, 0, 0, 0.3150184776, 0.3150184776, 0.3150184776], degree=2))
        make_face()
        with BuildLine():
            Line((12.0737168105, 4.3776710518), (13.6403288722, 4.3776710518))
            add(Edge.make_bspline(
                [(12.8147579899, 4.4270718536), (13.2445131721, 4.4270718536), (13.6403288722, 4.3776710518)],
                knots=[0, 0, 0, 0.3150184776, 0.3150184776, 0.3150184776], degree=2))
            add(Edge.make_bspline(
                [(12.0737168105, 4.3776710518), (12.4290735019, 4.4270718536), (12.8147579899, 4.4270718536)],
                knots=[0.6992762354, 0.6992762354, 0.6992762354, 1, 1, 1], degree=2))
        make_face()
    extrude(amount=F7_DEPTH)

    # F2 (on face) → F8 (cut)
    with BuildSketch(Plane.XZ.offset(8)):
        with Locations((-19, 26.5)):
            Circle(F2_R_2)
        with Locations((-19, 26.5)):
            Circle(F2_R, mode=Mode.SUBTRACT)
        with Locations((19, 26.5)):
            Circle(F2_R_2)
        with Locations((19, 26.5)):
            Circle(F2_R, mode=Mode.SUBTRACT)
    extrude(amount=-F8_DEPTH, mode=Mode.SUBTRACT)

    # F2 (on face) → F9 (cut, through all)
    with BuildSketch(Plane.XZ.offset(8)):
        with Locations((-19, 26.5)):
            Circle(F2_R)
        with Locations((19, 26.5)):
            Circle(F2_R)
    extrude(amount=-F9_DEPTH, mode=Mode.SUBTRACT)

    # F2 (on face) → F10 (cut, through all)
    with BuildSketch(Plane.XZ.offset(8)):
        with Locations((-19, -26.5)):
            Circle(F2_R)
        with Locations((19, -26.5)):
            Circle(F2_R)
    extrude(amount=-F10_DEPTH, mode=Mode.SUBTRACT)

    # F2 (on face) → F11 (cut)
    with BuildSketch(Plane.XZ.offset(8)):
        with Locations((-19, -26.5)):
            Circle(F2_R_2)
        with Locations((-19, -26.5)):
            Circle(F2_R, mode=Mode.SUBTRACT)
        with Locations((19, -26.5)):
            Circle(F2_R_2)
        with Locations((19, -26.5)):
            Circle(F2_R, mode=Mode.SUBTRACT)
    extrude(amount=-F11_DEPTH, mode=Mode.SUBTRACT)


solid = f1.part
